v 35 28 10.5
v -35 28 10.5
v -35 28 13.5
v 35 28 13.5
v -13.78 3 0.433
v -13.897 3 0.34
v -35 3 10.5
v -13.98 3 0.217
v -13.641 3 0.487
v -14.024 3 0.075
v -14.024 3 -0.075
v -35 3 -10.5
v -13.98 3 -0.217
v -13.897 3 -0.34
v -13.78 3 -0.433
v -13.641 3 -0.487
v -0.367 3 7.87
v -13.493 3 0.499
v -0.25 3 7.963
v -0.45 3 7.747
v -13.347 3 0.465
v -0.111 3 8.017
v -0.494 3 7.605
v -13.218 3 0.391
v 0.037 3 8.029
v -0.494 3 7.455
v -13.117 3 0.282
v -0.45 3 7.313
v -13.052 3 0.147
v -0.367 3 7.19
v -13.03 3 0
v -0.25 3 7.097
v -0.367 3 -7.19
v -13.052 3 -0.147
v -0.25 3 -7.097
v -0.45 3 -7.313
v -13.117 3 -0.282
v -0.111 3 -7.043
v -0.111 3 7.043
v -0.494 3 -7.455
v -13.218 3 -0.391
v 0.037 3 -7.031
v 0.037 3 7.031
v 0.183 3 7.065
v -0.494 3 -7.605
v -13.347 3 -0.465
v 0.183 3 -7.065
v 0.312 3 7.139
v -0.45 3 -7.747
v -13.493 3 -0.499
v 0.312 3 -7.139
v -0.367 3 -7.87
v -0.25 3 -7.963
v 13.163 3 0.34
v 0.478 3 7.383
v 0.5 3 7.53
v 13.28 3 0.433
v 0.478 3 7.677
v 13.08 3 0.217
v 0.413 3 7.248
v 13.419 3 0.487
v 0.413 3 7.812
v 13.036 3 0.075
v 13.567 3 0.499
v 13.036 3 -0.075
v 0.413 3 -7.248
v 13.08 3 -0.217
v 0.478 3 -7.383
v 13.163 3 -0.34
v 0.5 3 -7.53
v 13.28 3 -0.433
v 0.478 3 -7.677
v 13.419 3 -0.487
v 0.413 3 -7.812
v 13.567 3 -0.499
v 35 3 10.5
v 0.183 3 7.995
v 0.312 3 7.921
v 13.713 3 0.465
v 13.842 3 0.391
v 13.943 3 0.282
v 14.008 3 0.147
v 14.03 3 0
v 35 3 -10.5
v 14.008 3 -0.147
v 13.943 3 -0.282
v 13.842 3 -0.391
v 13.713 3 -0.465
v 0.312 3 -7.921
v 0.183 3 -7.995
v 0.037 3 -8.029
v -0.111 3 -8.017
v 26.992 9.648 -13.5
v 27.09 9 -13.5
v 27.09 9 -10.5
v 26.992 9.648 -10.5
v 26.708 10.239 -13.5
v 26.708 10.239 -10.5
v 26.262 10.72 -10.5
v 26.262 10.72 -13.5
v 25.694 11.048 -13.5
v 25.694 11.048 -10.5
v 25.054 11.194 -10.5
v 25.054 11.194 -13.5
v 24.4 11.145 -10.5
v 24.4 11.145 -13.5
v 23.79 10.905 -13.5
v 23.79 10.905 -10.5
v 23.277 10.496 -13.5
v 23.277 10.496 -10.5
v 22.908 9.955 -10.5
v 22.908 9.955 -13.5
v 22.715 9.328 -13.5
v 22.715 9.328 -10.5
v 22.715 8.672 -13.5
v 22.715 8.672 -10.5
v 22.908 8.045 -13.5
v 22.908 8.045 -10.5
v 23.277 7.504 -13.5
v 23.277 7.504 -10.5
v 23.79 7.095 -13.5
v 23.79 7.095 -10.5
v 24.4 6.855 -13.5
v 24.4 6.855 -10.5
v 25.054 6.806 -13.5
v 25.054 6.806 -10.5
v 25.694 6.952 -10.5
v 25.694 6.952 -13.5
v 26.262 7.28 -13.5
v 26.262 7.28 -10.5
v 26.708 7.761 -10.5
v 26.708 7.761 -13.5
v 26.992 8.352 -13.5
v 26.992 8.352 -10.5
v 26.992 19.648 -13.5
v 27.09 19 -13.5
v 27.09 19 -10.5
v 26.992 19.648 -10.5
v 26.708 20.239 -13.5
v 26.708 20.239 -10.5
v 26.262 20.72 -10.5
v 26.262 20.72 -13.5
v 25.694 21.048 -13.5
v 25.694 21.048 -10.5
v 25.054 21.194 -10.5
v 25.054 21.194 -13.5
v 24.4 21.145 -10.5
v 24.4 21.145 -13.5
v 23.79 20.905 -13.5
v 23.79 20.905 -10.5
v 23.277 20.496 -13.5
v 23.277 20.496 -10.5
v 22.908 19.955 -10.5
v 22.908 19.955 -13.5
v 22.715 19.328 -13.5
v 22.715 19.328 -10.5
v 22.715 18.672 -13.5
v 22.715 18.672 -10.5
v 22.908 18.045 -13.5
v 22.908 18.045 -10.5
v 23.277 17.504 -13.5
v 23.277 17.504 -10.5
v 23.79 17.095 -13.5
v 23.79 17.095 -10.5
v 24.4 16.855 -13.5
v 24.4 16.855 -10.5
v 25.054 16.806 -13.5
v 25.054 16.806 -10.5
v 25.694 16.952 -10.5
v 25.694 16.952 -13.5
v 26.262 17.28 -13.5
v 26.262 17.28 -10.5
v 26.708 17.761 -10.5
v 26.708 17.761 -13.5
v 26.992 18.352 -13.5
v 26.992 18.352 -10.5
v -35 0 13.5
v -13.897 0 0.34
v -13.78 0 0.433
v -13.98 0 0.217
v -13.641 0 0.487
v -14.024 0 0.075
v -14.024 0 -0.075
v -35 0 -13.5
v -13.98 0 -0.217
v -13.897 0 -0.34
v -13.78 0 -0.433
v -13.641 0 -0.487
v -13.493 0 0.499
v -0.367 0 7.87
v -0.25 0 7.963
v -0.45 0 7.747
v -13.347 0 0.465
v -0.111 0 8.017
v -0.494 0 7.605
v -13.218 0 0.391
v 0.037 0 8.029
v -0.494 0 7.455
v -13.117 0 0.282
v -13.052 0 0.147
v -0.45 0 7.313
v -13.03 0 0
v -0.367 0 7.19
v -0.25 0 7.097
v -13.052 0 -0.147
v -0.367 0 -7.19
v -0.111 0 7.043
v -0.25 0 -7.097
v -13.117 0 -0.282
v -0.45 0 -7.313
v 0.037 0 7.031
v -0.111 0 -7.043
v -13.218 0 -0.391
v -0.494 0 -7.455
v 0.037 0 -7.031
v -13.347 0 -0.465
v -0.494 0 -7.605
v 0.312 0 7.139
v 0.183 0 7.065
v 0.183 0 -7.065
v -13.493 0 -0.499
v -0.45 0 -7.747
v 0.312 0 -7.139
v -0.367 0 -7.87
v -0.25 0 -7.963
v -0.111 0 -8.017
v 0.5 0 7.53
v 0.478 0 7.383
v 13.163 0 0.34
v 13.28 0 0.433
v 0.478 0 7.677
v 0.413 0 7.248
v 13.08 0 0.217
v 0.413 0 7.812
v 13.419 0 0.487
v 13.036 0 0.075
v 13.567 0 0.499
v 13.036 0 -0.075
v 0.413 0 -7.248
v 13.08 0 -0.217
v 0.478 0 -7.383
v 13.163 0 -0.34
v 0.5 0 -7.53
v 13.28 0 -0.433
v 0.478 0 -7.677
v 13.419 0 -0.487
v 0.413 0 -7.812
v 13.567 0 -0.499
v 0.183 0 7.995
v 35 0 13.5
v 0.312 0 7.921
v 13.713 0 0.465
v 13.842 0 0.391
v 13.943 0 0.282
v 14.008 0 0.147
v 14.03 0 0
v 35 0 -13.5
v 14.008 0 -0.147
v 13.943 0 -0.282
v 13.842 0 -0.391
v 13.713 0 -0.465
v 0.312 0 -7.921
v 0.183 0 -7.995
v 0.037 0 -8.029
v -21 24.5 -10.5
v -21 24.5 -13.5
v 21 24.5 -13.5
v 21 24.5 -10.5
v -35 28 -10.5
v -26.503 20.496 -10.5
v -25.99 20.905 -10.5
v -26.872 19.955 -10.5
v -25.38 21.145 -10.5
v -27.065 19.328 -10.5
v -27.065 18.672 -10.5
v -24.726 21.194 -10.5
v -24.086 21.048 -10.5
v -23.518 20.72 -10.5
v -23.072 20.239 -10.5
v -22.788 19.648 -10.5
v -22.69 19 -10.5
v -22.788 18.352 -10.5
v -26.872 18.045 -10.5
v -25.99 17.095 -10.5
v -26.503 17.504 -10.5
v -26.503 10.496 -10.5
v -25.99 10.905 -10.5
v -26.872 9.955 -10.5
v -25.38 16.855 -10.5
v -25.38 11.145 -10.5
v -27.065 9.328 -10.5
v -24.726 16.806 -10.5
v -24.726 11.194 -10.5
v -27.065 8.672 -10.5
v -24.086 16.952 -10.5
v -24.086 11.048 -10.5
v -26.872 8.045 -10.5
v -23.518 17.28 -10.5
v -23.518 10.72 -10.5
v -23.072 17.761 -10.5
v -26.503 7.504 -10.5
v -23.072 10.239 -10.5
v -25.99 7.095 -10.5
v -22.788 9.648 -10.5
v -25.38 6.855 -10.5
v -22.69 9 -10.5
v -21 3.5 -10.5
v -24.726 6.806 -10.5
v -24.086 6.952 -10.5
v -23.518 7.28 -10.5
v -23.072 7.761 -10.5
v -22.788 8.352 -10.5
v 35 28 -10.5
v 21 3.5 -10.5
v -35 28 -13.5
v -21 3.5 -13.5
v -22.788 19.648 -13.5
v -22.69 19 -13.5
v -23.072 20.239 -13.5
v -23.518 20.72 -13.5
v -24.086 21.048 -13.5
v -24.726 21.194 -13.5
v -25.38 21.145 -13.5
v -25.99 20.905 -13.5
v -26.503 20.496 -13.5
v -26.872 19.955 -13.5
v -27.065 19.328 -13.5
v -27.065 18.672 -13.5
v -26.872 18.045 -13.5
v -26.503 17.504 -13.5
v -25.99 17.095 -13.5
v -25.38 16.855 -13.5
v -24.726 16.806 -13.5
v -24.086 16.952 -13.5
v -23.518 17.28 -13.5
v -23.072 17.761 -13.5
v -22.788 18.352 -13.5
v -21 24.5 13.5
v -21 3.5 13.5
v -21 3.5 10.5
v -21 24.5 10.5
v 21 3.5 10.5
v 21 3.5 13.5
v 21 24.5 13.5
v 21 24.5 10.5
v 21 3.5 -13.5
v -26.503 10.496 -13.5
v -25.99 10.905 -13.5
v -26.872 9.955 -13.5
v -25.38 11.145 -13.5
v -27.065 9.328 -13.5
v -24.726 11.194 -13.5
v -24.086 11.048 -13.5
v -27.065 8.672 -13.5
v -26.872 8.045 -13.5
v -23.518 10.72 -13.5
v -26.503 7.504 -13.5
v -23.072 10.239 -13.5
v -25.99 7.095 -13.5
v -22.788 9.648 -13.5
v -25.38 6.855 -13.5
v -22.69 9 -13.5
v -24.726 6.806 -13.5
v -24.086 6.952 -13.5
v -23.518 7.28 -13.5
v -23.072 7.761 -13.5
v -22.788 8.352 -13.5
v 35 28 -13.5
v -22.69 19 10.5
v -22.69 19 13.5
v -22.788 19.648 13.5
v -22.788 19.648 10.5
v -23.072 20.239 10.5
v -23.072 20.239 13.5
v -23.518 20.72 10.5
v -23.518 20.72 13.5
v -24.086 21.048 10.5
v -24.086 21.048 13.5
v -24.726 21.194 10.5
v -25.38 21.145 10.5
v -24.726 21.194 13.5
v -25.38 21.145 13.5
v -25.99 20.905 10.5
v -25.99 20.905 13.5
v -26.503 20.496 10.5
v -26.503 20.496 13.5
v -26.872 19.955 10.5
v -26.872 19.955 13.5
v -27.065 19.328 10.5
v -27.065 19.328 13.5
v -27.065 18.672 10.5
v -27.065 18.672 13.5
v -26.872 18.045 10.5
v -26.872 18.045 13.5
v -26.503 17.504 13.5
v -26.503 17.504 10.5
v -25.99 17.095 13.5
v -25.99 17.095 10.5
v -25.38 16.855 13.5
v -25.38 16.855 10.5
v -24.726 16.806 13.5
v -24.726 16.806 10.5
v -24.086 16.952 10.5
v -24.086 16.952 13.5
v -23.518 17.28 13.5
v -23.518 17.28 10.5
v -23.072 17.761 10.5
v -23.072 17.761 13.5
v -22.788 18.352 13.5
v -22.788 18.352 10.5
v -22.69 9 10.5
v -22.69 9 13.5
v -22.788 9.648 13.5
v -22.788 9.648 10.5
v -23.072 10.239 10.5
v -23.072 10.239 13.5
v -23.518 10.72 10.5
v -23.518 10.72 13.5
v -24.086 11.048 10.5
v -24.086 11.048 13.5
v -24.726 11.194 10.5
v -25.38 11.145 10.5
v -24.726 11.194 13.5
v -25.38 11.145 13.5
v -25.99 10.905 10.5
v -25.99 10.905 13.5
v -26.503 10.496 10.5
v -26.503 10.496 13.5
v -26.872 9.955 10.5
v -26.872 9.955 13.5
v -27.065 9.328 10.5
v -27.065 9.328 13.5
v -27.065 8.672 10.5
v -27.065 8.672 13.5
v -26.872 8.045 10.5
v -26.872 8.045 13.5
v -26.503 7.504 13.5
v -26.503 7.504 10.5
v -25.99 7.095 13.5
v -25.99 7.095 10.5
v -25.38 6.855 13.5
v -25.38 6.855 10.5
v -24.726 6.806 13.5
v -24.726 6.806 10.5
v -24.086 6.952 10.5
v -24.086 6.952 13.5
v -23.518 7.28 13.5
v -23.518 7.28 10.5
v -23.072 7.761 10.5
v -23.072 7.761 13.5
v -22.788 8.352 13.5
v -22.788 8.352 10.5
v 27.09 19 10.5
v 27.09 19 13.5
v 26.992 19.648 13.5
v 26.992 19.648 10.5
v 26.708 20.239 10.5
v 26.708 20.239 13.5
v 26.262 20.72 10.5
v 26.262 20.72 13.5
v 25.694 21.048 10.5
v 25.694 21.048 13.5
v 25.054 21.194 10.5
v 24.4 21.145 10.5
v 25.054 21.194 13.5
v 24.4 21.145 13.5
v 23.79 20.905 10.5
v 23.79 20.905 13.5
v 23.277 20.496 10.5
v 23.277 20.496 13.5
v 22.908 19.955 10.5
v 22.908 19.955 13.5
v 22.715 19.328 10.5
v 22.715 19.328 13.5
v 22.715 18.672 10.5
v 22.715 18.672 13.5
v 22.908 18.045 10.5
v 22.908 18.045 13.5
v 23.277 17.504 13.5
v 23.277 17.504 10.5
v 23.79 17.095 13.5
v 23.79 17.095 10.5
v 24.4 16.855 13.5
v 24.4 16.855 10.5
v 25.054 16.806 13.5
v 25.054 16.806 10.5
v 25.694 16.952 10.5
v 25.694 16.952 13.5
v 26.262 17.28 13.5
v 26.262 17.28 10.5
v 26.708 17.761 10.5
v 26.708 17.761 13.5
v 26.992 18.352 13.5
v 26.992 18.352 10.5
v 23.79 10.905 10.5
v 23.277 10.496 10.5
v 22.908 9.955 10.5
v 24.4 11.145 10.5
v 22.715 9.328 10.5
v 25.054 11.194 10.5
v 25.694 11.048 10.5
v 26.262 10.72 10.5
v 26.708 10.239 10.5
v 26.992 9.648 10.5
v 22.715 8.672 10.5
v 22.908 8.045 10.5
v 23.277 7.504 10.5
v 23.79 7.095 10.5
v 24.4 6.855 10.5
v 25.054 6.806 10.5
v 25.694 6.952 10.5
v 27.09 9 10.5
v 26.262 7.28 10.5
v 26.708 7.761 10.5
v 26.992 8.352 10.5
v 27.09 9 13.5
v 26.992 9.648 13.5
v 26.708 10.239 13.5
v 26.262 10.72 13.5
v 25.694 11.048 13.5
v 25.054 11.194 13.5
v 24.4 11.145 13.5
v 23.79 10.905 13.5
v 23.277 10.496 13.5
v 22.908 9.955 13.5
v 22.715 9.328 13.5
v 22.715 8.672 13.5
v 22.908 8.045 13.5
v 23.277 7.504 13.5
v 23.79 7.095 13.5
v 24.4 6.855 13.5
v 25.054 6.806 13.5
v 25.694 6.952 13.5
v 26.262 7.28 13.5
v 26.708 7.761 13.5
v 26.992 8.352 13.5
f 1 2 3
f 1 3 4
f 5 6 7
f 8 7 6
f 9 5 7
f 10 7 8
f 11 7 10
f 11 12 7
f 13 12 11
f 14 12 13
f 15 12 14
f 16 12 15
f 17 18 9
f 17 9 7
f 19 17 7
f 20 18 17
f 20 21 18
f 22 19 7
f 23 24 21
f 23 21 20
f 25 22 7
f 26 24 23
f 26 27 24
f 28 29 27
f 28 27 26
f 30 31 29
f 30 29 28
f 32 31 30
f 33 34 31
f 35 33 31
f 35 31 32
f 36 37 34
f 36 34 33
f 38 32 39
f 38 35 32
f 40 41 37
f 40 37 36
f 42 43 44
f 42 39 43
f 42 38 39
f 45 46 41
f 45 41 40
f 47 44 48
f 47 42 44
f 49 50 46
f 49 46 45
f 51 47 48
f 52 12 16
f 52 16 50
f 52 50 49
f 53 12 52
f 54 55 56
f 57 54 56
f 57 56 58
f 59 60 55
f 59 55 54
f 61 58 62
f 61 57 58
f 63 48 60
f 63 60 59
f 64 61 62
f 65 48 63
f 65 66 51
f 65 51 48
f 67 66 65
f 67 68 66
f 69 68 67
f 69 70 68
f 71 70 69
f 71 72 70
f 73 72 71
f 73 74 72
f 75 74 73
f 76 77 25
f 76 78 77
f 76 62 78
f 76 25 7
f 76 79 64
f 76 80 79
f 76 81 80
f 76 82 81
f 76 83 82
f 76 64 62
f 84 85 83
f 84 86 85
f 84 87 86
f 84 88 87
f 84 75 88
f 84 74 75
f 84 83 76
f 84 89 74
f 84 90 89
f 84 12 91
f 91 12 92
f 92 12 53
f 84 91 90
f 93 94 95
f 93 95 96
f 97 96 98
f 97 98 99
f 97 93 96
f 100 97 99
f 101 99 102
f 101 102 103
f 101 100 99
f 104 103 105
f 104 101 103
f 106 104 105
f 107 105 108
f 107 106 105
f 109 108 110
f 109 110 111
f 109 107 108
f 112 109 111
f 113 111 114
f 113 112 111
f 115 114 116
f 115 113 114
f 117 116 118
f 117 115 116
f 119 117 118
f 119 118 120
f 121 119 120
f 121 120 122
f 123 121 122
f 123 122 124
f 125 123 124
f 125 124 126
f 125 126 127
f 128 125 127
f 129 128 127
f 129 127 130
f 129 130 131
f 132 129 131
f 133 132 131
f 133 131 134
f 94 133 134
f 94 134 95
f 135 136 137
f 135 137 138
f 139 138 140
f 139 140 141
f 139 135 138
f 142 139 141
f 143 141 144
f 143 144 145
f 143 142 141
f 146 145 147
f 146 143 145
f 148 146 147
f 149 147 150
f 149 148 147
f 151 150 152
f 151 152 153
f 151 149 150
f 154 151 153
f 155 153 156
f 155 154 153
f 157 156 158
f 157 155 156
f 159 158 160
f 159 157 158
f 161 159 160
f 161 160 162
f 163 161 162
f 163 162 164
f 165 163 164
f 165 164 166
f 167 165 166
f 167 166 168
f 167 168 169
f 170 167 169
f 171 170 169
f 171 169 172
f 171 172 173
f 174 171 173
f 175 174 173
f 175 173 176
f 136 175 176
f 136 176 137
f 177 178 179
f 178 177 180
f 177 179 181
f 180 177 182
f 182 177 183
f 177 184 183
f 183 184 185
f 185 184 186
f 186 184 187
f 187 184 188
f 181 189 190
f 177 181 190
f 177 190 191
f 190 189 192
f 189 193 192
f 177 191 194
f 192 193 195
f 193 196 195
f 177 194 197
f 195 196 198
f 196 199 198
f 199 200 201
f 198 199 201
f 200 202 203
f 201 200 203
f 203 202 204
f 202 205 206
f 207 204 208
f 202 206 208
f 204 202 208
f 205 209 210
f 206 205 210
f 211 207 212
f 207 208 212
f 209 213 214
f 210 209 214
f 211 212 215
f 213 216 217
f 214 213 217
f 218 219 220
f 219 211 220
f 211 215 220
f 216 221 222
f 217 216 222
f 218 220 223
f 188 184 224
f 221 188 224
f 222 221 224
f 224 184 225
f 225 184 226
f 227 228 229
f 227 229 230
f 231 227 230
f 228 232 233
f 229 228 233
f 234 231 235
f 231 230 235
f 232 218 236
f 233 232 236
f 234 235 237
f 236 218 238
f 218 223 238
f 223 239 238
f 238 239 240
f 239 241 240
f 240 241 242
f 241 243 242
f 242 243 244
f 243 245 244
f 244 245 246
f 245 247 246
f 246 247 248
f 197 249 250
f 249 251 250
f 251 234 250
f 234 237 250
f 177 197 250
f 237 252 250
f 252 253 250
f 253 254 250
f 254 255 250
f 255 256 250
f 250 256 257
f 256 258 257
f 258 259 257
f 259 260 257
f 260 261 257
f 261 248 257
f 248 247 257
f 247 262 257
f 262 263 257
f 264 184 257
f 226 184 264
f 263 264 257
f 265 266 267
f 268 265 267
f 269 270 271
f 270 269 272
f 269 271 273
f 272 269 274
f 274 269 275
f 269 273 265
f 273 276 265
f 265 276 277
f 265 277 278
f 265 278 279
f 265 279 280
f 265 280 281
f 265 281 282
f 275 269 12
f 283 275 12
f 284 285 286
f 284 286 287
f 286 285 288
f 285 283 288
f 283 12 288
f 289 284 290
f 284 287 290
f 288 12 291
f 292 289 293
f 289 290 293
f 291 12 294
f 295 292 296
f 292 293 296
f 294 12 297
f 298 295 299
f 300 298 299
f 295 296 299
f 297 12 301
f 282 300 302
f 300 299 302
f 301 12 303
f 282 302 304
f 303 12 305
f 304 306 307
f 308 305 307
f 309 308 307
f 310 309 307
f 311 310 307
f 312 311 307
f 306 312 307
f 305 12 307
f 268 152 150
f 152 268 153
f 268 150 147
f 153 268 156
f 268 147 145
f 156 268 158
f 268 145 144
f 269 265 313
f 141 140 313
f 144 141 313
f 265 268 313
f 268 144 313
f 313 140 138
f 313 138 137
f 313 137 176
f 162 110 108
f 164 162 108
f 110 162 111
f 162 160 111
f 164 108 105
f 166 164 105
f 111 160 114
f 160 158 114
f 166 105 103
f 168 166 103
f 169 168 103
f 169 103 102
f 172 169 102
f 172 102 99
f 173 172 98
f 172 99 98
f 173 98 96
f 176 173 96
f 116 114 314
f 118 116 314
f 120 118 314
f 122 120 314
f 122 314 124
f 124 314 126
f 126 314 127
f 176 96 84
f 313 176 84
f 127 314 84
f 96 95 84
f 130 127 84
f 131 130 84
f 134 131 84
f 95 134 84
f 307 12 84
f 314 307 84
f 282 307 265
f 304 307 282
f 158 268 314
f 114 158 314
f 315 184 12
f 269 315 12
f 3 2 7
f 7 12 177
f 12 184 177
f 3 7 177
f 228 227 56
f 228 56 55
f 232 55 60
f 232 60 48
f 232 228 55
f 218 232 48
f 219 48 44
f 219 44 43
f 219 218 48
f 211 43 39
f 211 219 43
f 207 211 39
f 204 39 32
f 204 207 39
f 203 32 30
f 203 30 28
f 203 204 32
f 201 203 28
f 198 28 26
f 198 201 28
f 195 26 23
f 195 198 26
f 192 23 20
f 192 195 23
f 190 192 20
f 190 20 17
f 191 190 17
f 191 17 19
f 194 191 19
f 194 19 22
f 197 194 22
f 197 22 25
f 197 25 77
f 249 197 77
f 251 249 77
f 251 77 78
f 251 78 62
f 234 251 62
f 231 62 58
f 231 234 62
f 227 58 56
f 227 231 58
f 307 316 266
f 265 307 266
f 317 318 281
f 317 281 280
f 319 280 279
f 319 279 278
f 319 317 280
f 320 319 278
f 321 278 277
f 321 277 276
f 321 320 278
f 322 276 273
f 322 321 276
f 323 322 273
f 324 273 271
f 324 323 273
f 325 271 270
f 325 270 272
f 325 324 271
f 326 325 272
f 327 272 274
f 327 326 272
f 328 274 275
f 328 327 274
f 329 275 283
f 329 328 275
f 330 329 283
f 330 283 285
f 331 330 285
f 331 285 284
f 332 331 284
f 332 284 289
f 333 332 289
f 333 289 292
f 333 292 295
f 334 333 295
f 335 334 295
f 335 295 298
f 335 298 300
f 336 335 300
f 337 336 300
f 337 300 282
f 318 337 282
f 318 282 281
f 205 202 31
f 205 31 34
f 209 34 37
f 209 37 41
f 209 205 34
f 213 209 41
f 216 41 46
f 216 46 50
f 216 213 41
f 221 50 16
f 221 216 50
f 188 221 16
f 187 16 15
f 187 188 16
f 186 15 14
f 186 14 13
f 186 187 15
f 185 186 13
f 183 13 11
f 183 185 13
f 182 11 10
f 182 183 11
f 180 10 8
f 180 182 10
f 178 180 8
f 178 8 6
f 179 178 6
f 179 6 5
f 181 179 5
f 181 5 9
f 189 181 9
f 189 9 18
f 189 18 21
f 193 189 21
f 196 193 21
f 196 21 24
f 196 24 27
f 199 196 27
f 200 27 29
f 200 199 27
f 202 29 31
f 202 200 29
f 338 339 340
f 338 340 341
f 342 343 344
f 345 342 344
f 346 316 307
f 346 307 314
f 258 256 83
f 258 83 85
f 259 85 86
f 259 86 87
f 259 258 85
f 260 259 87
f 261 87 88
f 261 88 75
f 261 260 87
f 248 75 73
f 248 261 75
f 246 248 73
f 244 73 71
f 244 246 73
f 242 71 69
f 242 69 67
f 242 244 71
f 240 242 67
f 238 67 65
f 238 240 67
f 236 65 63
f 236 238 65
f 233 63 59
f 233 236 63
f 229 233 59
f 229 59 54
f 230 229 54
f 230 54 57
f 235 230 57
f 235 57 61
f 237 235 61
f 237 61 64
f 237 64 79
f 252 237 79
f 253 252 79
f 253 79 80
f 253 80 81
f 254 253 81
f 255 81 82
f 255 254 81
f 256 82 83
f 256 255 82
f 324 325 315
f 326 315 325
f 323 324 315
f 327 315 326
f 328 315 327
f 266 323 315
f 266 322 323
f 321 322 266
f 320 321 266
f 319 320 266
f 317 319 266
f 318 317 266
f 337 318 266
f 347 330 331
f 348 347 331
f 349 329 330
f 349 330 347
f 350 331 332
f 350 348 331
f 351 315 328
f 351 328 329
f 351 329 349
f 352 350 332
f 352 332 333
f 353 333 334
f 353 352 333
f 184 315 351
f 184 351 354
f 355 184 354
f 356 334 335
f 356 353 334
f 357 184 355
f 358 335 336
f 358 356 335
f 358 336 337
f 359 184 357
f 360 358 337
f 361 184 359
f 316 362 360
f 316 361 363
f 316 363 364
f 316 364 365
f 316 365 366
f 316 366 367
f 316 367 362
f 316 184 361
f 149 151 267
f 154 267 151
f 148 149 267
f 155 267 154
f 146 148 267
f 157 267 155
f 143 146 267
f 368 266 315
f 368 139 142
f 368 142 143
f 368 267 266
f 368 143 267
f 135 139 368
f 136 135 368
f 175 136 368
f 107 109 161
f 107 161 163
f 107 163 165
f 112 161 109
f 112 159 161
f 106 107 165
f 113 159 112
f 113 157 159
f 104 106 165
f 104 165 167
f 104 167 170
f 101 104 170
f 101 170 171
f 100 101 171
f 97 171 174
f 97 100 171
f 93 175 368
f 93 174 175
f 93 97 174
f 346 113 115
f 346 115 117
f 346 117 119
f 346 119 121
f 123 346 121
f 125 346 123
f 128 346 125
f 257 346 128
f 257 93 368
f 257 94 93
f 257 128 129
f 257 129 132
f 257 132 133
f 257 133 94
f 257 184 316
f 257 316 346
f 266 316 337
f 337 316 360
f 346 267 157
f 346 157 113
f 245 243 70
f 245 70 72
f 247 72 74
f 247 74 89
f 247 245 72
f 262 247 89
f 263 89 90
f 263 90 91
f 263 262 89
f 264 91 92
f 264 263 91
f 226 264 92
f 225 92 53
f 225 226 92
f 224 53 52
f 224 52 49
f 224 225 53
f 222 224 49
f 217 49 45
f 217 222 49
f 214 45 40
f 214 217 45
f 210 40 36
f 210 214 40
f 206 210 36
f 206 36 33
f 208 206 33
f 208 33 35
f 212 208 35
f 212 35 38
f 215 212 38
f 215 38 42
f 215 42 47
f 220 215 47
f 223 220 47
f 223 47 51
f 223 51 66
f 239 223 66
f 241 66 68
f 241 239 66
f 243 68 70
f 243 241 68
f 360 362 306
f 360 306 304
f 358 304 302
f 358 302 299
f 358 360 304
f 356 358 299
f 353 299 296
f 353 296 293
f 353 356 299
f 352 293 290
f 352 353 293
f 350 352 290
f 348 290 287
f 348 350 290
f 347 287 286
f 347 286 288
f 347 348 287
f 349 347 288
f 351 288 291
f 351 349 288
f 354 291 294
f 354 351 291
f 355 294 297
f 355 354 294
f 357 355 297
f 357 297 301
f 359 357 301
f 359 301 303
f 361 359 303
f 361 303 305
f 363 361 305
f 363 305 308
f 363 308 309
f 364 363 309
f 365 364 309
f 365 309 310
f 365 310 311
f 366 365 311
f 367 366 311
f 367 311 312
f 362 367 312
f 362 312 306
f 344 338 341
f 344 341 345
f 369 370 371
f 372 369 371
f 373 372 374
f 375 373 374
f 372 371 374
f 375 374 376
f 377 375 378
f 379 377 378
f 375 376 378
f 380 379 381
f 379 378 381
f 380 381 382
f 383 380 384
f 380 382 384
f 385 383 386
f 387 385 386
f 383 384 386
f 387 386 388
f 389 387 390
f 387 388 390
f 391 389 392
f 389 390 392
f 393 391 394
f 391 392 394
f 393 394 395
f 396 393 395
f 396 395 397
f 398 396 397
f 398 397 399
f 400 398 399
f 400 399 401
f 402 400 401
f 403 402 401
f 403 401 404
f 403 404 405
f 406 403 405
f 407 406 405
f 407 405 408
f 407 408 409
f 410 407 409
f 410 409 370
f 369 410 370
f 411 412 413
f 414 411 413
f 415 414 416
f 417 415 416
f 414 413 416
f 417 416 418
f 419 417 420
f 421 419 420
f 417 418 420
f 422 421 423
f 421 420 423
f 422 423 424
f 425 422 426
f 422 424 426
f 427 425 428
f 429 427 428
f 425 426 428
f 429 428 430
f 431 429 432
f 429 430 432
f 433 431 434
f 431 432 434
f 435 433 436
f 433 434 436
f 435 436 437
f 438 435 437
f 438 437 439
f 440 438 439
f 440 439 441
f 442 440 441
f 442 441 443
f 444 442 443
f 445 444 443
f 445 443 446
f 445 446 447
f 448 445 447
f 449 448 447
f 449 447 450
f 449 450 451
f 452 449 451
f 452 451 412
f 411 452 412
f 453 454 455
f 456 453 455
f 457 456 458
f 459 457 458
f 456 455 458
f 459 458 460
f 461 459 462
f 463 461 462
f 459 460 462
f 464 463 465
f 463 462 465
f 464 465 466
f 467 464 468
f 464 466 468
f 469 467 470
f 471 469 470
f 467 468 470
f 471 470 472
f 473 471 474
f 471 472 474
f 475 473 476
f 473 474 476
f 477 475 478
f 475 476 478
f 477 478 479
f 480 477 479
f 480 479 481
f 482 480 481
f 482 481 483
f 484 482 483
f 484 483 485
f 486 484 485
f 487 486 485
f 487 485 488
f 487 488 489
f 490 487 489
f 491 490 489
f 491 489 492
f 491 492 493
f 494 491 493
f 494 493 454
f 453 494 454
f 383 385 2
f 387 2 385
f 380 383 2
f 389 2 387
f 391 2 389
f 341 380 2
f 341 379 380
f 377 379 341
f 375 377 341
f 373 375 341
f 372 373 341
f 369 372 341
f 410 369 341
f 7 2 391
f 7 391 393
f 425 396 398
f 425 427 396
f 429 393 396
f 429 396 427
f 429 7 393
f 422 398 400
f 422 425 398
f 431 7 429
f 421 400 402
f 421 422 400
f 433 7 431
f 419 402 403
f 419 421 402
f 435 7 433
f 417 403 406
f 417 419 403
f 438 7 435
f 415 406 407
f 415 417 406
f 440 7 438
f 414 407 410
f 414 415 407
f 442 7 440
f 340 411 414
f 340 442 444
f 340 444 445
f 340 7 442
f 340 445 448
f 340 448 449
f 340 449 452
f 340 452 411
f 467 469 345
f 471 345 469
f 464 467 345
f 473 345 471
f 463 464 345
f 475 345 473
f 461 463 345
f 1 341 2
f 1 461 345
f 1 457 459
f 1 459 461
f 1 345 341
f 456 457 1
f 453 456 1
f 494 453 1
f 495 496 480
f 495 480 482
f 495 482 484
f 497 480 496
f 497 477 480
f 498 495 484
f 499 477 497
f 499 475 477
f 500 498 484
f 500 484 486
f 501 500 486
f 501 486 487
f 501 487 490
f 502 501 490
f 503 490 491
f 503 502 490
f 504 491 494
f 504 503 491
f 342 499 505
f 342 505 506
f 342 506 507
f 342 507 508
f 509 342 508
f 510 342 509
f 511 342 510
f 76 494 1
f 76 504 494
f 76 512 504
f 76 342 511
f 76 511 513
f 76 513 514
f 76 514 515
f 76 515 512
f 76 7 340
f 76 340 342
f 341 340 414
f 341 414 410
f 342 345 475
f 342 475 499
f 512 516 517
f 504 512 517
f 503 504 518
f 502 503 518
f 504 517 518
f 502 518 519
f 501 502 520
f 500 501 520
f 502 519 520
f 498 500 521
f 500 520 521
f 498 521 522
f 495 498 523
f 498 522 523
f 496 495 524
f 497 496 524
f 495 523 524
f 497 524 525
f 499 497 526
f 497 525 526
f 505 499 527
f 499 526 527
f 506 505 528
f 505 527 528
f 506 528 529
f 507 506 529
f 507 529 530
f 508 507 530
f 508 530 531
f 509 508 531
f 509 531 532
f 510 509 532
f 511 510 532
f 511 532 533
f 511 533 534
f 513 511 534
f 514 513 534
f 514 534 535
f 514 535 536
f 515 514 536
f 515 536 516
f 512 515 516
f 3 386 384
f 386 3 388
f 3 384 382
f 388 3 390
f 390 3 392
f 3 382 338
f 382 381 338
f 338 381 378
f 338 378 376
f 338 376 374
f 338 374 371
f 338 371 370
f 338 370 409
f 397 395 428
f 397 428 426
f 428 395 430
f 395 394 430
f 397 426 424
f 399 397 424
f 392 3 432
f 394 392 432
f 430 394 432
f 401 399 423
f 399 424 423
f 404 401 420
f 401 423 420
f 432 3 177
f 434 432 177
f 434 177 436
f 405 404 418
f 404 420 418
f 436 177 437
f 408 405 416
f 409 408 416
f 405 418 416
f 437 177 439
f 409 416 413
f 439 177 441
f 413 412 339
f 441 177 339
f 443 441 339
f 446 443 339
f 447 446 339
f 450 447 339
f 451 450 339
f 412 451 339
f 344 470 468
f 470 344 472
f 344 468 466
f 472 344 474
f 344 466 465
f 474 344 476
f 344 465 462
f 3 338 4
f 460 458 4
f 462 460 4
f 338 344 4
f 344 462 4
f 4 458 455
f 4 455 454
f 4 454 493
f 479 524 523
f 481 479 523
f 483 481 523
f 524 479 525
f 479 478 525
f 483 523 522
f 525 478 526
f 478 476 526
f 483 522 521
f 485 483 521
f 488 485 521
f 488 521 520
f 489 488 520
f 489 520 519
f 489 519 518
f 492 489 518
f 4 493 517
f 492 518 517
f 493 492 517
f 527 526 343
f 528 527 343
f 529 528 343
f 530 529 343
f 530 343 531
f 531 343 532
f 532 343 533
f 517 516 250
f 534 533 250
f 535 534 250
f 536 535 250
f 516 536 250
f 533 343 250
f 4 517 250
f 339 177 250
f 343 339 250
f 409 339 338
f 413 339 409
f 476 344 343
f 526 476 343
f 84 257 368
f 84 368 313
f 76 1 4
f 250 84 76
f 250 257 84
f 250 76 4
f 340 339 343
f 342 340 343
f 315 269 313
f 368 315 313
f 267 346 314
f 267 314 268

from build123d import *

# Parameters (mm, degrees)
SKETCH1_W           = 70
SKETCH1_H           = 27
SKETCH1_R           = 0.5
BOSS_EXTRUDE2_DEPTH = 3
SKETCH2_W           = 70
SKETCH2_H           = 3
BOSS_EXTRUDE3_DEPTH = 25
SKETCH3_R           = 2.2
SKETCH3_W           = 42
SKETCH3_H           = 21
CUT_EXTRUDE1_DEPTH  = 25


with BuildPart() as part:
    # Sketch1 → Boss-Extrude2 (new body)
    with BuildSketch(Plane(origin=(0, 0, 0), x_dir=(1, 0, 0), z_dir=(0, 1, 0))):
        Rectangle(SKETCH1_W, SKETCH1_H)
        with Locations((-13.53, 0)):
            Circle(SKETCH1_R, mode=Mode.SUBTRACT)
        with Locations((0, 7.53)):
            Circle(SKETCH1_R, mode=Mode.SUBTRACT)
        with Locations((0, -7.53)):
            Circle(SKETCH1_R, mode=Mode.SUBTRACT)
        with Locations((13.53, 0)):
            Circle(SKETCH1_R, mode=Mode.SUBTRACT)
    extrude(amount=BOSS_EXTRUDE2_DEPTH)

    # Sketch2 → Boss-Extrude3 (add)
    with BuildSketch(Plane(origin=(0, 3, 0), x_dir=(1, 0, 0), z_dir=(0, 1, 0))):
        with Locations((0, -12)):
            Rectangle(SKETCH2_W, SKETCH2_H)
    extrude(amount=BOSS_EXTRUDE3_DEPTH)

    # Sketch3 → Cut-Extrude1 (cut)
    with BuildSketch(Plane.XY.offset(13.5)):
        with Locations((-24.89, 9)):
            Circle(SKETCH3_R)
        with Locations((-24.89, 19)):
            Circle(SKETCH3_R)
        with Locations((0, 14)):
            Rectangle(SKETCH3_W, SKETCH3_H)
        with Locations((24.89, 19)):
            Circle(SKETCH3_R)
        with Locations((24.89, 9)):
            Circle(SKETCH3_R)
    extrude(amount=-CUT_EXTRUDE1_DEPTH, mode=Mode.SUBTRACT)

    # Mirror1: part across plane


with BuildPart() as part_1:
    add(part.part)
    add(part.part.mirror(Plane.XY))


solid = part_1.part
